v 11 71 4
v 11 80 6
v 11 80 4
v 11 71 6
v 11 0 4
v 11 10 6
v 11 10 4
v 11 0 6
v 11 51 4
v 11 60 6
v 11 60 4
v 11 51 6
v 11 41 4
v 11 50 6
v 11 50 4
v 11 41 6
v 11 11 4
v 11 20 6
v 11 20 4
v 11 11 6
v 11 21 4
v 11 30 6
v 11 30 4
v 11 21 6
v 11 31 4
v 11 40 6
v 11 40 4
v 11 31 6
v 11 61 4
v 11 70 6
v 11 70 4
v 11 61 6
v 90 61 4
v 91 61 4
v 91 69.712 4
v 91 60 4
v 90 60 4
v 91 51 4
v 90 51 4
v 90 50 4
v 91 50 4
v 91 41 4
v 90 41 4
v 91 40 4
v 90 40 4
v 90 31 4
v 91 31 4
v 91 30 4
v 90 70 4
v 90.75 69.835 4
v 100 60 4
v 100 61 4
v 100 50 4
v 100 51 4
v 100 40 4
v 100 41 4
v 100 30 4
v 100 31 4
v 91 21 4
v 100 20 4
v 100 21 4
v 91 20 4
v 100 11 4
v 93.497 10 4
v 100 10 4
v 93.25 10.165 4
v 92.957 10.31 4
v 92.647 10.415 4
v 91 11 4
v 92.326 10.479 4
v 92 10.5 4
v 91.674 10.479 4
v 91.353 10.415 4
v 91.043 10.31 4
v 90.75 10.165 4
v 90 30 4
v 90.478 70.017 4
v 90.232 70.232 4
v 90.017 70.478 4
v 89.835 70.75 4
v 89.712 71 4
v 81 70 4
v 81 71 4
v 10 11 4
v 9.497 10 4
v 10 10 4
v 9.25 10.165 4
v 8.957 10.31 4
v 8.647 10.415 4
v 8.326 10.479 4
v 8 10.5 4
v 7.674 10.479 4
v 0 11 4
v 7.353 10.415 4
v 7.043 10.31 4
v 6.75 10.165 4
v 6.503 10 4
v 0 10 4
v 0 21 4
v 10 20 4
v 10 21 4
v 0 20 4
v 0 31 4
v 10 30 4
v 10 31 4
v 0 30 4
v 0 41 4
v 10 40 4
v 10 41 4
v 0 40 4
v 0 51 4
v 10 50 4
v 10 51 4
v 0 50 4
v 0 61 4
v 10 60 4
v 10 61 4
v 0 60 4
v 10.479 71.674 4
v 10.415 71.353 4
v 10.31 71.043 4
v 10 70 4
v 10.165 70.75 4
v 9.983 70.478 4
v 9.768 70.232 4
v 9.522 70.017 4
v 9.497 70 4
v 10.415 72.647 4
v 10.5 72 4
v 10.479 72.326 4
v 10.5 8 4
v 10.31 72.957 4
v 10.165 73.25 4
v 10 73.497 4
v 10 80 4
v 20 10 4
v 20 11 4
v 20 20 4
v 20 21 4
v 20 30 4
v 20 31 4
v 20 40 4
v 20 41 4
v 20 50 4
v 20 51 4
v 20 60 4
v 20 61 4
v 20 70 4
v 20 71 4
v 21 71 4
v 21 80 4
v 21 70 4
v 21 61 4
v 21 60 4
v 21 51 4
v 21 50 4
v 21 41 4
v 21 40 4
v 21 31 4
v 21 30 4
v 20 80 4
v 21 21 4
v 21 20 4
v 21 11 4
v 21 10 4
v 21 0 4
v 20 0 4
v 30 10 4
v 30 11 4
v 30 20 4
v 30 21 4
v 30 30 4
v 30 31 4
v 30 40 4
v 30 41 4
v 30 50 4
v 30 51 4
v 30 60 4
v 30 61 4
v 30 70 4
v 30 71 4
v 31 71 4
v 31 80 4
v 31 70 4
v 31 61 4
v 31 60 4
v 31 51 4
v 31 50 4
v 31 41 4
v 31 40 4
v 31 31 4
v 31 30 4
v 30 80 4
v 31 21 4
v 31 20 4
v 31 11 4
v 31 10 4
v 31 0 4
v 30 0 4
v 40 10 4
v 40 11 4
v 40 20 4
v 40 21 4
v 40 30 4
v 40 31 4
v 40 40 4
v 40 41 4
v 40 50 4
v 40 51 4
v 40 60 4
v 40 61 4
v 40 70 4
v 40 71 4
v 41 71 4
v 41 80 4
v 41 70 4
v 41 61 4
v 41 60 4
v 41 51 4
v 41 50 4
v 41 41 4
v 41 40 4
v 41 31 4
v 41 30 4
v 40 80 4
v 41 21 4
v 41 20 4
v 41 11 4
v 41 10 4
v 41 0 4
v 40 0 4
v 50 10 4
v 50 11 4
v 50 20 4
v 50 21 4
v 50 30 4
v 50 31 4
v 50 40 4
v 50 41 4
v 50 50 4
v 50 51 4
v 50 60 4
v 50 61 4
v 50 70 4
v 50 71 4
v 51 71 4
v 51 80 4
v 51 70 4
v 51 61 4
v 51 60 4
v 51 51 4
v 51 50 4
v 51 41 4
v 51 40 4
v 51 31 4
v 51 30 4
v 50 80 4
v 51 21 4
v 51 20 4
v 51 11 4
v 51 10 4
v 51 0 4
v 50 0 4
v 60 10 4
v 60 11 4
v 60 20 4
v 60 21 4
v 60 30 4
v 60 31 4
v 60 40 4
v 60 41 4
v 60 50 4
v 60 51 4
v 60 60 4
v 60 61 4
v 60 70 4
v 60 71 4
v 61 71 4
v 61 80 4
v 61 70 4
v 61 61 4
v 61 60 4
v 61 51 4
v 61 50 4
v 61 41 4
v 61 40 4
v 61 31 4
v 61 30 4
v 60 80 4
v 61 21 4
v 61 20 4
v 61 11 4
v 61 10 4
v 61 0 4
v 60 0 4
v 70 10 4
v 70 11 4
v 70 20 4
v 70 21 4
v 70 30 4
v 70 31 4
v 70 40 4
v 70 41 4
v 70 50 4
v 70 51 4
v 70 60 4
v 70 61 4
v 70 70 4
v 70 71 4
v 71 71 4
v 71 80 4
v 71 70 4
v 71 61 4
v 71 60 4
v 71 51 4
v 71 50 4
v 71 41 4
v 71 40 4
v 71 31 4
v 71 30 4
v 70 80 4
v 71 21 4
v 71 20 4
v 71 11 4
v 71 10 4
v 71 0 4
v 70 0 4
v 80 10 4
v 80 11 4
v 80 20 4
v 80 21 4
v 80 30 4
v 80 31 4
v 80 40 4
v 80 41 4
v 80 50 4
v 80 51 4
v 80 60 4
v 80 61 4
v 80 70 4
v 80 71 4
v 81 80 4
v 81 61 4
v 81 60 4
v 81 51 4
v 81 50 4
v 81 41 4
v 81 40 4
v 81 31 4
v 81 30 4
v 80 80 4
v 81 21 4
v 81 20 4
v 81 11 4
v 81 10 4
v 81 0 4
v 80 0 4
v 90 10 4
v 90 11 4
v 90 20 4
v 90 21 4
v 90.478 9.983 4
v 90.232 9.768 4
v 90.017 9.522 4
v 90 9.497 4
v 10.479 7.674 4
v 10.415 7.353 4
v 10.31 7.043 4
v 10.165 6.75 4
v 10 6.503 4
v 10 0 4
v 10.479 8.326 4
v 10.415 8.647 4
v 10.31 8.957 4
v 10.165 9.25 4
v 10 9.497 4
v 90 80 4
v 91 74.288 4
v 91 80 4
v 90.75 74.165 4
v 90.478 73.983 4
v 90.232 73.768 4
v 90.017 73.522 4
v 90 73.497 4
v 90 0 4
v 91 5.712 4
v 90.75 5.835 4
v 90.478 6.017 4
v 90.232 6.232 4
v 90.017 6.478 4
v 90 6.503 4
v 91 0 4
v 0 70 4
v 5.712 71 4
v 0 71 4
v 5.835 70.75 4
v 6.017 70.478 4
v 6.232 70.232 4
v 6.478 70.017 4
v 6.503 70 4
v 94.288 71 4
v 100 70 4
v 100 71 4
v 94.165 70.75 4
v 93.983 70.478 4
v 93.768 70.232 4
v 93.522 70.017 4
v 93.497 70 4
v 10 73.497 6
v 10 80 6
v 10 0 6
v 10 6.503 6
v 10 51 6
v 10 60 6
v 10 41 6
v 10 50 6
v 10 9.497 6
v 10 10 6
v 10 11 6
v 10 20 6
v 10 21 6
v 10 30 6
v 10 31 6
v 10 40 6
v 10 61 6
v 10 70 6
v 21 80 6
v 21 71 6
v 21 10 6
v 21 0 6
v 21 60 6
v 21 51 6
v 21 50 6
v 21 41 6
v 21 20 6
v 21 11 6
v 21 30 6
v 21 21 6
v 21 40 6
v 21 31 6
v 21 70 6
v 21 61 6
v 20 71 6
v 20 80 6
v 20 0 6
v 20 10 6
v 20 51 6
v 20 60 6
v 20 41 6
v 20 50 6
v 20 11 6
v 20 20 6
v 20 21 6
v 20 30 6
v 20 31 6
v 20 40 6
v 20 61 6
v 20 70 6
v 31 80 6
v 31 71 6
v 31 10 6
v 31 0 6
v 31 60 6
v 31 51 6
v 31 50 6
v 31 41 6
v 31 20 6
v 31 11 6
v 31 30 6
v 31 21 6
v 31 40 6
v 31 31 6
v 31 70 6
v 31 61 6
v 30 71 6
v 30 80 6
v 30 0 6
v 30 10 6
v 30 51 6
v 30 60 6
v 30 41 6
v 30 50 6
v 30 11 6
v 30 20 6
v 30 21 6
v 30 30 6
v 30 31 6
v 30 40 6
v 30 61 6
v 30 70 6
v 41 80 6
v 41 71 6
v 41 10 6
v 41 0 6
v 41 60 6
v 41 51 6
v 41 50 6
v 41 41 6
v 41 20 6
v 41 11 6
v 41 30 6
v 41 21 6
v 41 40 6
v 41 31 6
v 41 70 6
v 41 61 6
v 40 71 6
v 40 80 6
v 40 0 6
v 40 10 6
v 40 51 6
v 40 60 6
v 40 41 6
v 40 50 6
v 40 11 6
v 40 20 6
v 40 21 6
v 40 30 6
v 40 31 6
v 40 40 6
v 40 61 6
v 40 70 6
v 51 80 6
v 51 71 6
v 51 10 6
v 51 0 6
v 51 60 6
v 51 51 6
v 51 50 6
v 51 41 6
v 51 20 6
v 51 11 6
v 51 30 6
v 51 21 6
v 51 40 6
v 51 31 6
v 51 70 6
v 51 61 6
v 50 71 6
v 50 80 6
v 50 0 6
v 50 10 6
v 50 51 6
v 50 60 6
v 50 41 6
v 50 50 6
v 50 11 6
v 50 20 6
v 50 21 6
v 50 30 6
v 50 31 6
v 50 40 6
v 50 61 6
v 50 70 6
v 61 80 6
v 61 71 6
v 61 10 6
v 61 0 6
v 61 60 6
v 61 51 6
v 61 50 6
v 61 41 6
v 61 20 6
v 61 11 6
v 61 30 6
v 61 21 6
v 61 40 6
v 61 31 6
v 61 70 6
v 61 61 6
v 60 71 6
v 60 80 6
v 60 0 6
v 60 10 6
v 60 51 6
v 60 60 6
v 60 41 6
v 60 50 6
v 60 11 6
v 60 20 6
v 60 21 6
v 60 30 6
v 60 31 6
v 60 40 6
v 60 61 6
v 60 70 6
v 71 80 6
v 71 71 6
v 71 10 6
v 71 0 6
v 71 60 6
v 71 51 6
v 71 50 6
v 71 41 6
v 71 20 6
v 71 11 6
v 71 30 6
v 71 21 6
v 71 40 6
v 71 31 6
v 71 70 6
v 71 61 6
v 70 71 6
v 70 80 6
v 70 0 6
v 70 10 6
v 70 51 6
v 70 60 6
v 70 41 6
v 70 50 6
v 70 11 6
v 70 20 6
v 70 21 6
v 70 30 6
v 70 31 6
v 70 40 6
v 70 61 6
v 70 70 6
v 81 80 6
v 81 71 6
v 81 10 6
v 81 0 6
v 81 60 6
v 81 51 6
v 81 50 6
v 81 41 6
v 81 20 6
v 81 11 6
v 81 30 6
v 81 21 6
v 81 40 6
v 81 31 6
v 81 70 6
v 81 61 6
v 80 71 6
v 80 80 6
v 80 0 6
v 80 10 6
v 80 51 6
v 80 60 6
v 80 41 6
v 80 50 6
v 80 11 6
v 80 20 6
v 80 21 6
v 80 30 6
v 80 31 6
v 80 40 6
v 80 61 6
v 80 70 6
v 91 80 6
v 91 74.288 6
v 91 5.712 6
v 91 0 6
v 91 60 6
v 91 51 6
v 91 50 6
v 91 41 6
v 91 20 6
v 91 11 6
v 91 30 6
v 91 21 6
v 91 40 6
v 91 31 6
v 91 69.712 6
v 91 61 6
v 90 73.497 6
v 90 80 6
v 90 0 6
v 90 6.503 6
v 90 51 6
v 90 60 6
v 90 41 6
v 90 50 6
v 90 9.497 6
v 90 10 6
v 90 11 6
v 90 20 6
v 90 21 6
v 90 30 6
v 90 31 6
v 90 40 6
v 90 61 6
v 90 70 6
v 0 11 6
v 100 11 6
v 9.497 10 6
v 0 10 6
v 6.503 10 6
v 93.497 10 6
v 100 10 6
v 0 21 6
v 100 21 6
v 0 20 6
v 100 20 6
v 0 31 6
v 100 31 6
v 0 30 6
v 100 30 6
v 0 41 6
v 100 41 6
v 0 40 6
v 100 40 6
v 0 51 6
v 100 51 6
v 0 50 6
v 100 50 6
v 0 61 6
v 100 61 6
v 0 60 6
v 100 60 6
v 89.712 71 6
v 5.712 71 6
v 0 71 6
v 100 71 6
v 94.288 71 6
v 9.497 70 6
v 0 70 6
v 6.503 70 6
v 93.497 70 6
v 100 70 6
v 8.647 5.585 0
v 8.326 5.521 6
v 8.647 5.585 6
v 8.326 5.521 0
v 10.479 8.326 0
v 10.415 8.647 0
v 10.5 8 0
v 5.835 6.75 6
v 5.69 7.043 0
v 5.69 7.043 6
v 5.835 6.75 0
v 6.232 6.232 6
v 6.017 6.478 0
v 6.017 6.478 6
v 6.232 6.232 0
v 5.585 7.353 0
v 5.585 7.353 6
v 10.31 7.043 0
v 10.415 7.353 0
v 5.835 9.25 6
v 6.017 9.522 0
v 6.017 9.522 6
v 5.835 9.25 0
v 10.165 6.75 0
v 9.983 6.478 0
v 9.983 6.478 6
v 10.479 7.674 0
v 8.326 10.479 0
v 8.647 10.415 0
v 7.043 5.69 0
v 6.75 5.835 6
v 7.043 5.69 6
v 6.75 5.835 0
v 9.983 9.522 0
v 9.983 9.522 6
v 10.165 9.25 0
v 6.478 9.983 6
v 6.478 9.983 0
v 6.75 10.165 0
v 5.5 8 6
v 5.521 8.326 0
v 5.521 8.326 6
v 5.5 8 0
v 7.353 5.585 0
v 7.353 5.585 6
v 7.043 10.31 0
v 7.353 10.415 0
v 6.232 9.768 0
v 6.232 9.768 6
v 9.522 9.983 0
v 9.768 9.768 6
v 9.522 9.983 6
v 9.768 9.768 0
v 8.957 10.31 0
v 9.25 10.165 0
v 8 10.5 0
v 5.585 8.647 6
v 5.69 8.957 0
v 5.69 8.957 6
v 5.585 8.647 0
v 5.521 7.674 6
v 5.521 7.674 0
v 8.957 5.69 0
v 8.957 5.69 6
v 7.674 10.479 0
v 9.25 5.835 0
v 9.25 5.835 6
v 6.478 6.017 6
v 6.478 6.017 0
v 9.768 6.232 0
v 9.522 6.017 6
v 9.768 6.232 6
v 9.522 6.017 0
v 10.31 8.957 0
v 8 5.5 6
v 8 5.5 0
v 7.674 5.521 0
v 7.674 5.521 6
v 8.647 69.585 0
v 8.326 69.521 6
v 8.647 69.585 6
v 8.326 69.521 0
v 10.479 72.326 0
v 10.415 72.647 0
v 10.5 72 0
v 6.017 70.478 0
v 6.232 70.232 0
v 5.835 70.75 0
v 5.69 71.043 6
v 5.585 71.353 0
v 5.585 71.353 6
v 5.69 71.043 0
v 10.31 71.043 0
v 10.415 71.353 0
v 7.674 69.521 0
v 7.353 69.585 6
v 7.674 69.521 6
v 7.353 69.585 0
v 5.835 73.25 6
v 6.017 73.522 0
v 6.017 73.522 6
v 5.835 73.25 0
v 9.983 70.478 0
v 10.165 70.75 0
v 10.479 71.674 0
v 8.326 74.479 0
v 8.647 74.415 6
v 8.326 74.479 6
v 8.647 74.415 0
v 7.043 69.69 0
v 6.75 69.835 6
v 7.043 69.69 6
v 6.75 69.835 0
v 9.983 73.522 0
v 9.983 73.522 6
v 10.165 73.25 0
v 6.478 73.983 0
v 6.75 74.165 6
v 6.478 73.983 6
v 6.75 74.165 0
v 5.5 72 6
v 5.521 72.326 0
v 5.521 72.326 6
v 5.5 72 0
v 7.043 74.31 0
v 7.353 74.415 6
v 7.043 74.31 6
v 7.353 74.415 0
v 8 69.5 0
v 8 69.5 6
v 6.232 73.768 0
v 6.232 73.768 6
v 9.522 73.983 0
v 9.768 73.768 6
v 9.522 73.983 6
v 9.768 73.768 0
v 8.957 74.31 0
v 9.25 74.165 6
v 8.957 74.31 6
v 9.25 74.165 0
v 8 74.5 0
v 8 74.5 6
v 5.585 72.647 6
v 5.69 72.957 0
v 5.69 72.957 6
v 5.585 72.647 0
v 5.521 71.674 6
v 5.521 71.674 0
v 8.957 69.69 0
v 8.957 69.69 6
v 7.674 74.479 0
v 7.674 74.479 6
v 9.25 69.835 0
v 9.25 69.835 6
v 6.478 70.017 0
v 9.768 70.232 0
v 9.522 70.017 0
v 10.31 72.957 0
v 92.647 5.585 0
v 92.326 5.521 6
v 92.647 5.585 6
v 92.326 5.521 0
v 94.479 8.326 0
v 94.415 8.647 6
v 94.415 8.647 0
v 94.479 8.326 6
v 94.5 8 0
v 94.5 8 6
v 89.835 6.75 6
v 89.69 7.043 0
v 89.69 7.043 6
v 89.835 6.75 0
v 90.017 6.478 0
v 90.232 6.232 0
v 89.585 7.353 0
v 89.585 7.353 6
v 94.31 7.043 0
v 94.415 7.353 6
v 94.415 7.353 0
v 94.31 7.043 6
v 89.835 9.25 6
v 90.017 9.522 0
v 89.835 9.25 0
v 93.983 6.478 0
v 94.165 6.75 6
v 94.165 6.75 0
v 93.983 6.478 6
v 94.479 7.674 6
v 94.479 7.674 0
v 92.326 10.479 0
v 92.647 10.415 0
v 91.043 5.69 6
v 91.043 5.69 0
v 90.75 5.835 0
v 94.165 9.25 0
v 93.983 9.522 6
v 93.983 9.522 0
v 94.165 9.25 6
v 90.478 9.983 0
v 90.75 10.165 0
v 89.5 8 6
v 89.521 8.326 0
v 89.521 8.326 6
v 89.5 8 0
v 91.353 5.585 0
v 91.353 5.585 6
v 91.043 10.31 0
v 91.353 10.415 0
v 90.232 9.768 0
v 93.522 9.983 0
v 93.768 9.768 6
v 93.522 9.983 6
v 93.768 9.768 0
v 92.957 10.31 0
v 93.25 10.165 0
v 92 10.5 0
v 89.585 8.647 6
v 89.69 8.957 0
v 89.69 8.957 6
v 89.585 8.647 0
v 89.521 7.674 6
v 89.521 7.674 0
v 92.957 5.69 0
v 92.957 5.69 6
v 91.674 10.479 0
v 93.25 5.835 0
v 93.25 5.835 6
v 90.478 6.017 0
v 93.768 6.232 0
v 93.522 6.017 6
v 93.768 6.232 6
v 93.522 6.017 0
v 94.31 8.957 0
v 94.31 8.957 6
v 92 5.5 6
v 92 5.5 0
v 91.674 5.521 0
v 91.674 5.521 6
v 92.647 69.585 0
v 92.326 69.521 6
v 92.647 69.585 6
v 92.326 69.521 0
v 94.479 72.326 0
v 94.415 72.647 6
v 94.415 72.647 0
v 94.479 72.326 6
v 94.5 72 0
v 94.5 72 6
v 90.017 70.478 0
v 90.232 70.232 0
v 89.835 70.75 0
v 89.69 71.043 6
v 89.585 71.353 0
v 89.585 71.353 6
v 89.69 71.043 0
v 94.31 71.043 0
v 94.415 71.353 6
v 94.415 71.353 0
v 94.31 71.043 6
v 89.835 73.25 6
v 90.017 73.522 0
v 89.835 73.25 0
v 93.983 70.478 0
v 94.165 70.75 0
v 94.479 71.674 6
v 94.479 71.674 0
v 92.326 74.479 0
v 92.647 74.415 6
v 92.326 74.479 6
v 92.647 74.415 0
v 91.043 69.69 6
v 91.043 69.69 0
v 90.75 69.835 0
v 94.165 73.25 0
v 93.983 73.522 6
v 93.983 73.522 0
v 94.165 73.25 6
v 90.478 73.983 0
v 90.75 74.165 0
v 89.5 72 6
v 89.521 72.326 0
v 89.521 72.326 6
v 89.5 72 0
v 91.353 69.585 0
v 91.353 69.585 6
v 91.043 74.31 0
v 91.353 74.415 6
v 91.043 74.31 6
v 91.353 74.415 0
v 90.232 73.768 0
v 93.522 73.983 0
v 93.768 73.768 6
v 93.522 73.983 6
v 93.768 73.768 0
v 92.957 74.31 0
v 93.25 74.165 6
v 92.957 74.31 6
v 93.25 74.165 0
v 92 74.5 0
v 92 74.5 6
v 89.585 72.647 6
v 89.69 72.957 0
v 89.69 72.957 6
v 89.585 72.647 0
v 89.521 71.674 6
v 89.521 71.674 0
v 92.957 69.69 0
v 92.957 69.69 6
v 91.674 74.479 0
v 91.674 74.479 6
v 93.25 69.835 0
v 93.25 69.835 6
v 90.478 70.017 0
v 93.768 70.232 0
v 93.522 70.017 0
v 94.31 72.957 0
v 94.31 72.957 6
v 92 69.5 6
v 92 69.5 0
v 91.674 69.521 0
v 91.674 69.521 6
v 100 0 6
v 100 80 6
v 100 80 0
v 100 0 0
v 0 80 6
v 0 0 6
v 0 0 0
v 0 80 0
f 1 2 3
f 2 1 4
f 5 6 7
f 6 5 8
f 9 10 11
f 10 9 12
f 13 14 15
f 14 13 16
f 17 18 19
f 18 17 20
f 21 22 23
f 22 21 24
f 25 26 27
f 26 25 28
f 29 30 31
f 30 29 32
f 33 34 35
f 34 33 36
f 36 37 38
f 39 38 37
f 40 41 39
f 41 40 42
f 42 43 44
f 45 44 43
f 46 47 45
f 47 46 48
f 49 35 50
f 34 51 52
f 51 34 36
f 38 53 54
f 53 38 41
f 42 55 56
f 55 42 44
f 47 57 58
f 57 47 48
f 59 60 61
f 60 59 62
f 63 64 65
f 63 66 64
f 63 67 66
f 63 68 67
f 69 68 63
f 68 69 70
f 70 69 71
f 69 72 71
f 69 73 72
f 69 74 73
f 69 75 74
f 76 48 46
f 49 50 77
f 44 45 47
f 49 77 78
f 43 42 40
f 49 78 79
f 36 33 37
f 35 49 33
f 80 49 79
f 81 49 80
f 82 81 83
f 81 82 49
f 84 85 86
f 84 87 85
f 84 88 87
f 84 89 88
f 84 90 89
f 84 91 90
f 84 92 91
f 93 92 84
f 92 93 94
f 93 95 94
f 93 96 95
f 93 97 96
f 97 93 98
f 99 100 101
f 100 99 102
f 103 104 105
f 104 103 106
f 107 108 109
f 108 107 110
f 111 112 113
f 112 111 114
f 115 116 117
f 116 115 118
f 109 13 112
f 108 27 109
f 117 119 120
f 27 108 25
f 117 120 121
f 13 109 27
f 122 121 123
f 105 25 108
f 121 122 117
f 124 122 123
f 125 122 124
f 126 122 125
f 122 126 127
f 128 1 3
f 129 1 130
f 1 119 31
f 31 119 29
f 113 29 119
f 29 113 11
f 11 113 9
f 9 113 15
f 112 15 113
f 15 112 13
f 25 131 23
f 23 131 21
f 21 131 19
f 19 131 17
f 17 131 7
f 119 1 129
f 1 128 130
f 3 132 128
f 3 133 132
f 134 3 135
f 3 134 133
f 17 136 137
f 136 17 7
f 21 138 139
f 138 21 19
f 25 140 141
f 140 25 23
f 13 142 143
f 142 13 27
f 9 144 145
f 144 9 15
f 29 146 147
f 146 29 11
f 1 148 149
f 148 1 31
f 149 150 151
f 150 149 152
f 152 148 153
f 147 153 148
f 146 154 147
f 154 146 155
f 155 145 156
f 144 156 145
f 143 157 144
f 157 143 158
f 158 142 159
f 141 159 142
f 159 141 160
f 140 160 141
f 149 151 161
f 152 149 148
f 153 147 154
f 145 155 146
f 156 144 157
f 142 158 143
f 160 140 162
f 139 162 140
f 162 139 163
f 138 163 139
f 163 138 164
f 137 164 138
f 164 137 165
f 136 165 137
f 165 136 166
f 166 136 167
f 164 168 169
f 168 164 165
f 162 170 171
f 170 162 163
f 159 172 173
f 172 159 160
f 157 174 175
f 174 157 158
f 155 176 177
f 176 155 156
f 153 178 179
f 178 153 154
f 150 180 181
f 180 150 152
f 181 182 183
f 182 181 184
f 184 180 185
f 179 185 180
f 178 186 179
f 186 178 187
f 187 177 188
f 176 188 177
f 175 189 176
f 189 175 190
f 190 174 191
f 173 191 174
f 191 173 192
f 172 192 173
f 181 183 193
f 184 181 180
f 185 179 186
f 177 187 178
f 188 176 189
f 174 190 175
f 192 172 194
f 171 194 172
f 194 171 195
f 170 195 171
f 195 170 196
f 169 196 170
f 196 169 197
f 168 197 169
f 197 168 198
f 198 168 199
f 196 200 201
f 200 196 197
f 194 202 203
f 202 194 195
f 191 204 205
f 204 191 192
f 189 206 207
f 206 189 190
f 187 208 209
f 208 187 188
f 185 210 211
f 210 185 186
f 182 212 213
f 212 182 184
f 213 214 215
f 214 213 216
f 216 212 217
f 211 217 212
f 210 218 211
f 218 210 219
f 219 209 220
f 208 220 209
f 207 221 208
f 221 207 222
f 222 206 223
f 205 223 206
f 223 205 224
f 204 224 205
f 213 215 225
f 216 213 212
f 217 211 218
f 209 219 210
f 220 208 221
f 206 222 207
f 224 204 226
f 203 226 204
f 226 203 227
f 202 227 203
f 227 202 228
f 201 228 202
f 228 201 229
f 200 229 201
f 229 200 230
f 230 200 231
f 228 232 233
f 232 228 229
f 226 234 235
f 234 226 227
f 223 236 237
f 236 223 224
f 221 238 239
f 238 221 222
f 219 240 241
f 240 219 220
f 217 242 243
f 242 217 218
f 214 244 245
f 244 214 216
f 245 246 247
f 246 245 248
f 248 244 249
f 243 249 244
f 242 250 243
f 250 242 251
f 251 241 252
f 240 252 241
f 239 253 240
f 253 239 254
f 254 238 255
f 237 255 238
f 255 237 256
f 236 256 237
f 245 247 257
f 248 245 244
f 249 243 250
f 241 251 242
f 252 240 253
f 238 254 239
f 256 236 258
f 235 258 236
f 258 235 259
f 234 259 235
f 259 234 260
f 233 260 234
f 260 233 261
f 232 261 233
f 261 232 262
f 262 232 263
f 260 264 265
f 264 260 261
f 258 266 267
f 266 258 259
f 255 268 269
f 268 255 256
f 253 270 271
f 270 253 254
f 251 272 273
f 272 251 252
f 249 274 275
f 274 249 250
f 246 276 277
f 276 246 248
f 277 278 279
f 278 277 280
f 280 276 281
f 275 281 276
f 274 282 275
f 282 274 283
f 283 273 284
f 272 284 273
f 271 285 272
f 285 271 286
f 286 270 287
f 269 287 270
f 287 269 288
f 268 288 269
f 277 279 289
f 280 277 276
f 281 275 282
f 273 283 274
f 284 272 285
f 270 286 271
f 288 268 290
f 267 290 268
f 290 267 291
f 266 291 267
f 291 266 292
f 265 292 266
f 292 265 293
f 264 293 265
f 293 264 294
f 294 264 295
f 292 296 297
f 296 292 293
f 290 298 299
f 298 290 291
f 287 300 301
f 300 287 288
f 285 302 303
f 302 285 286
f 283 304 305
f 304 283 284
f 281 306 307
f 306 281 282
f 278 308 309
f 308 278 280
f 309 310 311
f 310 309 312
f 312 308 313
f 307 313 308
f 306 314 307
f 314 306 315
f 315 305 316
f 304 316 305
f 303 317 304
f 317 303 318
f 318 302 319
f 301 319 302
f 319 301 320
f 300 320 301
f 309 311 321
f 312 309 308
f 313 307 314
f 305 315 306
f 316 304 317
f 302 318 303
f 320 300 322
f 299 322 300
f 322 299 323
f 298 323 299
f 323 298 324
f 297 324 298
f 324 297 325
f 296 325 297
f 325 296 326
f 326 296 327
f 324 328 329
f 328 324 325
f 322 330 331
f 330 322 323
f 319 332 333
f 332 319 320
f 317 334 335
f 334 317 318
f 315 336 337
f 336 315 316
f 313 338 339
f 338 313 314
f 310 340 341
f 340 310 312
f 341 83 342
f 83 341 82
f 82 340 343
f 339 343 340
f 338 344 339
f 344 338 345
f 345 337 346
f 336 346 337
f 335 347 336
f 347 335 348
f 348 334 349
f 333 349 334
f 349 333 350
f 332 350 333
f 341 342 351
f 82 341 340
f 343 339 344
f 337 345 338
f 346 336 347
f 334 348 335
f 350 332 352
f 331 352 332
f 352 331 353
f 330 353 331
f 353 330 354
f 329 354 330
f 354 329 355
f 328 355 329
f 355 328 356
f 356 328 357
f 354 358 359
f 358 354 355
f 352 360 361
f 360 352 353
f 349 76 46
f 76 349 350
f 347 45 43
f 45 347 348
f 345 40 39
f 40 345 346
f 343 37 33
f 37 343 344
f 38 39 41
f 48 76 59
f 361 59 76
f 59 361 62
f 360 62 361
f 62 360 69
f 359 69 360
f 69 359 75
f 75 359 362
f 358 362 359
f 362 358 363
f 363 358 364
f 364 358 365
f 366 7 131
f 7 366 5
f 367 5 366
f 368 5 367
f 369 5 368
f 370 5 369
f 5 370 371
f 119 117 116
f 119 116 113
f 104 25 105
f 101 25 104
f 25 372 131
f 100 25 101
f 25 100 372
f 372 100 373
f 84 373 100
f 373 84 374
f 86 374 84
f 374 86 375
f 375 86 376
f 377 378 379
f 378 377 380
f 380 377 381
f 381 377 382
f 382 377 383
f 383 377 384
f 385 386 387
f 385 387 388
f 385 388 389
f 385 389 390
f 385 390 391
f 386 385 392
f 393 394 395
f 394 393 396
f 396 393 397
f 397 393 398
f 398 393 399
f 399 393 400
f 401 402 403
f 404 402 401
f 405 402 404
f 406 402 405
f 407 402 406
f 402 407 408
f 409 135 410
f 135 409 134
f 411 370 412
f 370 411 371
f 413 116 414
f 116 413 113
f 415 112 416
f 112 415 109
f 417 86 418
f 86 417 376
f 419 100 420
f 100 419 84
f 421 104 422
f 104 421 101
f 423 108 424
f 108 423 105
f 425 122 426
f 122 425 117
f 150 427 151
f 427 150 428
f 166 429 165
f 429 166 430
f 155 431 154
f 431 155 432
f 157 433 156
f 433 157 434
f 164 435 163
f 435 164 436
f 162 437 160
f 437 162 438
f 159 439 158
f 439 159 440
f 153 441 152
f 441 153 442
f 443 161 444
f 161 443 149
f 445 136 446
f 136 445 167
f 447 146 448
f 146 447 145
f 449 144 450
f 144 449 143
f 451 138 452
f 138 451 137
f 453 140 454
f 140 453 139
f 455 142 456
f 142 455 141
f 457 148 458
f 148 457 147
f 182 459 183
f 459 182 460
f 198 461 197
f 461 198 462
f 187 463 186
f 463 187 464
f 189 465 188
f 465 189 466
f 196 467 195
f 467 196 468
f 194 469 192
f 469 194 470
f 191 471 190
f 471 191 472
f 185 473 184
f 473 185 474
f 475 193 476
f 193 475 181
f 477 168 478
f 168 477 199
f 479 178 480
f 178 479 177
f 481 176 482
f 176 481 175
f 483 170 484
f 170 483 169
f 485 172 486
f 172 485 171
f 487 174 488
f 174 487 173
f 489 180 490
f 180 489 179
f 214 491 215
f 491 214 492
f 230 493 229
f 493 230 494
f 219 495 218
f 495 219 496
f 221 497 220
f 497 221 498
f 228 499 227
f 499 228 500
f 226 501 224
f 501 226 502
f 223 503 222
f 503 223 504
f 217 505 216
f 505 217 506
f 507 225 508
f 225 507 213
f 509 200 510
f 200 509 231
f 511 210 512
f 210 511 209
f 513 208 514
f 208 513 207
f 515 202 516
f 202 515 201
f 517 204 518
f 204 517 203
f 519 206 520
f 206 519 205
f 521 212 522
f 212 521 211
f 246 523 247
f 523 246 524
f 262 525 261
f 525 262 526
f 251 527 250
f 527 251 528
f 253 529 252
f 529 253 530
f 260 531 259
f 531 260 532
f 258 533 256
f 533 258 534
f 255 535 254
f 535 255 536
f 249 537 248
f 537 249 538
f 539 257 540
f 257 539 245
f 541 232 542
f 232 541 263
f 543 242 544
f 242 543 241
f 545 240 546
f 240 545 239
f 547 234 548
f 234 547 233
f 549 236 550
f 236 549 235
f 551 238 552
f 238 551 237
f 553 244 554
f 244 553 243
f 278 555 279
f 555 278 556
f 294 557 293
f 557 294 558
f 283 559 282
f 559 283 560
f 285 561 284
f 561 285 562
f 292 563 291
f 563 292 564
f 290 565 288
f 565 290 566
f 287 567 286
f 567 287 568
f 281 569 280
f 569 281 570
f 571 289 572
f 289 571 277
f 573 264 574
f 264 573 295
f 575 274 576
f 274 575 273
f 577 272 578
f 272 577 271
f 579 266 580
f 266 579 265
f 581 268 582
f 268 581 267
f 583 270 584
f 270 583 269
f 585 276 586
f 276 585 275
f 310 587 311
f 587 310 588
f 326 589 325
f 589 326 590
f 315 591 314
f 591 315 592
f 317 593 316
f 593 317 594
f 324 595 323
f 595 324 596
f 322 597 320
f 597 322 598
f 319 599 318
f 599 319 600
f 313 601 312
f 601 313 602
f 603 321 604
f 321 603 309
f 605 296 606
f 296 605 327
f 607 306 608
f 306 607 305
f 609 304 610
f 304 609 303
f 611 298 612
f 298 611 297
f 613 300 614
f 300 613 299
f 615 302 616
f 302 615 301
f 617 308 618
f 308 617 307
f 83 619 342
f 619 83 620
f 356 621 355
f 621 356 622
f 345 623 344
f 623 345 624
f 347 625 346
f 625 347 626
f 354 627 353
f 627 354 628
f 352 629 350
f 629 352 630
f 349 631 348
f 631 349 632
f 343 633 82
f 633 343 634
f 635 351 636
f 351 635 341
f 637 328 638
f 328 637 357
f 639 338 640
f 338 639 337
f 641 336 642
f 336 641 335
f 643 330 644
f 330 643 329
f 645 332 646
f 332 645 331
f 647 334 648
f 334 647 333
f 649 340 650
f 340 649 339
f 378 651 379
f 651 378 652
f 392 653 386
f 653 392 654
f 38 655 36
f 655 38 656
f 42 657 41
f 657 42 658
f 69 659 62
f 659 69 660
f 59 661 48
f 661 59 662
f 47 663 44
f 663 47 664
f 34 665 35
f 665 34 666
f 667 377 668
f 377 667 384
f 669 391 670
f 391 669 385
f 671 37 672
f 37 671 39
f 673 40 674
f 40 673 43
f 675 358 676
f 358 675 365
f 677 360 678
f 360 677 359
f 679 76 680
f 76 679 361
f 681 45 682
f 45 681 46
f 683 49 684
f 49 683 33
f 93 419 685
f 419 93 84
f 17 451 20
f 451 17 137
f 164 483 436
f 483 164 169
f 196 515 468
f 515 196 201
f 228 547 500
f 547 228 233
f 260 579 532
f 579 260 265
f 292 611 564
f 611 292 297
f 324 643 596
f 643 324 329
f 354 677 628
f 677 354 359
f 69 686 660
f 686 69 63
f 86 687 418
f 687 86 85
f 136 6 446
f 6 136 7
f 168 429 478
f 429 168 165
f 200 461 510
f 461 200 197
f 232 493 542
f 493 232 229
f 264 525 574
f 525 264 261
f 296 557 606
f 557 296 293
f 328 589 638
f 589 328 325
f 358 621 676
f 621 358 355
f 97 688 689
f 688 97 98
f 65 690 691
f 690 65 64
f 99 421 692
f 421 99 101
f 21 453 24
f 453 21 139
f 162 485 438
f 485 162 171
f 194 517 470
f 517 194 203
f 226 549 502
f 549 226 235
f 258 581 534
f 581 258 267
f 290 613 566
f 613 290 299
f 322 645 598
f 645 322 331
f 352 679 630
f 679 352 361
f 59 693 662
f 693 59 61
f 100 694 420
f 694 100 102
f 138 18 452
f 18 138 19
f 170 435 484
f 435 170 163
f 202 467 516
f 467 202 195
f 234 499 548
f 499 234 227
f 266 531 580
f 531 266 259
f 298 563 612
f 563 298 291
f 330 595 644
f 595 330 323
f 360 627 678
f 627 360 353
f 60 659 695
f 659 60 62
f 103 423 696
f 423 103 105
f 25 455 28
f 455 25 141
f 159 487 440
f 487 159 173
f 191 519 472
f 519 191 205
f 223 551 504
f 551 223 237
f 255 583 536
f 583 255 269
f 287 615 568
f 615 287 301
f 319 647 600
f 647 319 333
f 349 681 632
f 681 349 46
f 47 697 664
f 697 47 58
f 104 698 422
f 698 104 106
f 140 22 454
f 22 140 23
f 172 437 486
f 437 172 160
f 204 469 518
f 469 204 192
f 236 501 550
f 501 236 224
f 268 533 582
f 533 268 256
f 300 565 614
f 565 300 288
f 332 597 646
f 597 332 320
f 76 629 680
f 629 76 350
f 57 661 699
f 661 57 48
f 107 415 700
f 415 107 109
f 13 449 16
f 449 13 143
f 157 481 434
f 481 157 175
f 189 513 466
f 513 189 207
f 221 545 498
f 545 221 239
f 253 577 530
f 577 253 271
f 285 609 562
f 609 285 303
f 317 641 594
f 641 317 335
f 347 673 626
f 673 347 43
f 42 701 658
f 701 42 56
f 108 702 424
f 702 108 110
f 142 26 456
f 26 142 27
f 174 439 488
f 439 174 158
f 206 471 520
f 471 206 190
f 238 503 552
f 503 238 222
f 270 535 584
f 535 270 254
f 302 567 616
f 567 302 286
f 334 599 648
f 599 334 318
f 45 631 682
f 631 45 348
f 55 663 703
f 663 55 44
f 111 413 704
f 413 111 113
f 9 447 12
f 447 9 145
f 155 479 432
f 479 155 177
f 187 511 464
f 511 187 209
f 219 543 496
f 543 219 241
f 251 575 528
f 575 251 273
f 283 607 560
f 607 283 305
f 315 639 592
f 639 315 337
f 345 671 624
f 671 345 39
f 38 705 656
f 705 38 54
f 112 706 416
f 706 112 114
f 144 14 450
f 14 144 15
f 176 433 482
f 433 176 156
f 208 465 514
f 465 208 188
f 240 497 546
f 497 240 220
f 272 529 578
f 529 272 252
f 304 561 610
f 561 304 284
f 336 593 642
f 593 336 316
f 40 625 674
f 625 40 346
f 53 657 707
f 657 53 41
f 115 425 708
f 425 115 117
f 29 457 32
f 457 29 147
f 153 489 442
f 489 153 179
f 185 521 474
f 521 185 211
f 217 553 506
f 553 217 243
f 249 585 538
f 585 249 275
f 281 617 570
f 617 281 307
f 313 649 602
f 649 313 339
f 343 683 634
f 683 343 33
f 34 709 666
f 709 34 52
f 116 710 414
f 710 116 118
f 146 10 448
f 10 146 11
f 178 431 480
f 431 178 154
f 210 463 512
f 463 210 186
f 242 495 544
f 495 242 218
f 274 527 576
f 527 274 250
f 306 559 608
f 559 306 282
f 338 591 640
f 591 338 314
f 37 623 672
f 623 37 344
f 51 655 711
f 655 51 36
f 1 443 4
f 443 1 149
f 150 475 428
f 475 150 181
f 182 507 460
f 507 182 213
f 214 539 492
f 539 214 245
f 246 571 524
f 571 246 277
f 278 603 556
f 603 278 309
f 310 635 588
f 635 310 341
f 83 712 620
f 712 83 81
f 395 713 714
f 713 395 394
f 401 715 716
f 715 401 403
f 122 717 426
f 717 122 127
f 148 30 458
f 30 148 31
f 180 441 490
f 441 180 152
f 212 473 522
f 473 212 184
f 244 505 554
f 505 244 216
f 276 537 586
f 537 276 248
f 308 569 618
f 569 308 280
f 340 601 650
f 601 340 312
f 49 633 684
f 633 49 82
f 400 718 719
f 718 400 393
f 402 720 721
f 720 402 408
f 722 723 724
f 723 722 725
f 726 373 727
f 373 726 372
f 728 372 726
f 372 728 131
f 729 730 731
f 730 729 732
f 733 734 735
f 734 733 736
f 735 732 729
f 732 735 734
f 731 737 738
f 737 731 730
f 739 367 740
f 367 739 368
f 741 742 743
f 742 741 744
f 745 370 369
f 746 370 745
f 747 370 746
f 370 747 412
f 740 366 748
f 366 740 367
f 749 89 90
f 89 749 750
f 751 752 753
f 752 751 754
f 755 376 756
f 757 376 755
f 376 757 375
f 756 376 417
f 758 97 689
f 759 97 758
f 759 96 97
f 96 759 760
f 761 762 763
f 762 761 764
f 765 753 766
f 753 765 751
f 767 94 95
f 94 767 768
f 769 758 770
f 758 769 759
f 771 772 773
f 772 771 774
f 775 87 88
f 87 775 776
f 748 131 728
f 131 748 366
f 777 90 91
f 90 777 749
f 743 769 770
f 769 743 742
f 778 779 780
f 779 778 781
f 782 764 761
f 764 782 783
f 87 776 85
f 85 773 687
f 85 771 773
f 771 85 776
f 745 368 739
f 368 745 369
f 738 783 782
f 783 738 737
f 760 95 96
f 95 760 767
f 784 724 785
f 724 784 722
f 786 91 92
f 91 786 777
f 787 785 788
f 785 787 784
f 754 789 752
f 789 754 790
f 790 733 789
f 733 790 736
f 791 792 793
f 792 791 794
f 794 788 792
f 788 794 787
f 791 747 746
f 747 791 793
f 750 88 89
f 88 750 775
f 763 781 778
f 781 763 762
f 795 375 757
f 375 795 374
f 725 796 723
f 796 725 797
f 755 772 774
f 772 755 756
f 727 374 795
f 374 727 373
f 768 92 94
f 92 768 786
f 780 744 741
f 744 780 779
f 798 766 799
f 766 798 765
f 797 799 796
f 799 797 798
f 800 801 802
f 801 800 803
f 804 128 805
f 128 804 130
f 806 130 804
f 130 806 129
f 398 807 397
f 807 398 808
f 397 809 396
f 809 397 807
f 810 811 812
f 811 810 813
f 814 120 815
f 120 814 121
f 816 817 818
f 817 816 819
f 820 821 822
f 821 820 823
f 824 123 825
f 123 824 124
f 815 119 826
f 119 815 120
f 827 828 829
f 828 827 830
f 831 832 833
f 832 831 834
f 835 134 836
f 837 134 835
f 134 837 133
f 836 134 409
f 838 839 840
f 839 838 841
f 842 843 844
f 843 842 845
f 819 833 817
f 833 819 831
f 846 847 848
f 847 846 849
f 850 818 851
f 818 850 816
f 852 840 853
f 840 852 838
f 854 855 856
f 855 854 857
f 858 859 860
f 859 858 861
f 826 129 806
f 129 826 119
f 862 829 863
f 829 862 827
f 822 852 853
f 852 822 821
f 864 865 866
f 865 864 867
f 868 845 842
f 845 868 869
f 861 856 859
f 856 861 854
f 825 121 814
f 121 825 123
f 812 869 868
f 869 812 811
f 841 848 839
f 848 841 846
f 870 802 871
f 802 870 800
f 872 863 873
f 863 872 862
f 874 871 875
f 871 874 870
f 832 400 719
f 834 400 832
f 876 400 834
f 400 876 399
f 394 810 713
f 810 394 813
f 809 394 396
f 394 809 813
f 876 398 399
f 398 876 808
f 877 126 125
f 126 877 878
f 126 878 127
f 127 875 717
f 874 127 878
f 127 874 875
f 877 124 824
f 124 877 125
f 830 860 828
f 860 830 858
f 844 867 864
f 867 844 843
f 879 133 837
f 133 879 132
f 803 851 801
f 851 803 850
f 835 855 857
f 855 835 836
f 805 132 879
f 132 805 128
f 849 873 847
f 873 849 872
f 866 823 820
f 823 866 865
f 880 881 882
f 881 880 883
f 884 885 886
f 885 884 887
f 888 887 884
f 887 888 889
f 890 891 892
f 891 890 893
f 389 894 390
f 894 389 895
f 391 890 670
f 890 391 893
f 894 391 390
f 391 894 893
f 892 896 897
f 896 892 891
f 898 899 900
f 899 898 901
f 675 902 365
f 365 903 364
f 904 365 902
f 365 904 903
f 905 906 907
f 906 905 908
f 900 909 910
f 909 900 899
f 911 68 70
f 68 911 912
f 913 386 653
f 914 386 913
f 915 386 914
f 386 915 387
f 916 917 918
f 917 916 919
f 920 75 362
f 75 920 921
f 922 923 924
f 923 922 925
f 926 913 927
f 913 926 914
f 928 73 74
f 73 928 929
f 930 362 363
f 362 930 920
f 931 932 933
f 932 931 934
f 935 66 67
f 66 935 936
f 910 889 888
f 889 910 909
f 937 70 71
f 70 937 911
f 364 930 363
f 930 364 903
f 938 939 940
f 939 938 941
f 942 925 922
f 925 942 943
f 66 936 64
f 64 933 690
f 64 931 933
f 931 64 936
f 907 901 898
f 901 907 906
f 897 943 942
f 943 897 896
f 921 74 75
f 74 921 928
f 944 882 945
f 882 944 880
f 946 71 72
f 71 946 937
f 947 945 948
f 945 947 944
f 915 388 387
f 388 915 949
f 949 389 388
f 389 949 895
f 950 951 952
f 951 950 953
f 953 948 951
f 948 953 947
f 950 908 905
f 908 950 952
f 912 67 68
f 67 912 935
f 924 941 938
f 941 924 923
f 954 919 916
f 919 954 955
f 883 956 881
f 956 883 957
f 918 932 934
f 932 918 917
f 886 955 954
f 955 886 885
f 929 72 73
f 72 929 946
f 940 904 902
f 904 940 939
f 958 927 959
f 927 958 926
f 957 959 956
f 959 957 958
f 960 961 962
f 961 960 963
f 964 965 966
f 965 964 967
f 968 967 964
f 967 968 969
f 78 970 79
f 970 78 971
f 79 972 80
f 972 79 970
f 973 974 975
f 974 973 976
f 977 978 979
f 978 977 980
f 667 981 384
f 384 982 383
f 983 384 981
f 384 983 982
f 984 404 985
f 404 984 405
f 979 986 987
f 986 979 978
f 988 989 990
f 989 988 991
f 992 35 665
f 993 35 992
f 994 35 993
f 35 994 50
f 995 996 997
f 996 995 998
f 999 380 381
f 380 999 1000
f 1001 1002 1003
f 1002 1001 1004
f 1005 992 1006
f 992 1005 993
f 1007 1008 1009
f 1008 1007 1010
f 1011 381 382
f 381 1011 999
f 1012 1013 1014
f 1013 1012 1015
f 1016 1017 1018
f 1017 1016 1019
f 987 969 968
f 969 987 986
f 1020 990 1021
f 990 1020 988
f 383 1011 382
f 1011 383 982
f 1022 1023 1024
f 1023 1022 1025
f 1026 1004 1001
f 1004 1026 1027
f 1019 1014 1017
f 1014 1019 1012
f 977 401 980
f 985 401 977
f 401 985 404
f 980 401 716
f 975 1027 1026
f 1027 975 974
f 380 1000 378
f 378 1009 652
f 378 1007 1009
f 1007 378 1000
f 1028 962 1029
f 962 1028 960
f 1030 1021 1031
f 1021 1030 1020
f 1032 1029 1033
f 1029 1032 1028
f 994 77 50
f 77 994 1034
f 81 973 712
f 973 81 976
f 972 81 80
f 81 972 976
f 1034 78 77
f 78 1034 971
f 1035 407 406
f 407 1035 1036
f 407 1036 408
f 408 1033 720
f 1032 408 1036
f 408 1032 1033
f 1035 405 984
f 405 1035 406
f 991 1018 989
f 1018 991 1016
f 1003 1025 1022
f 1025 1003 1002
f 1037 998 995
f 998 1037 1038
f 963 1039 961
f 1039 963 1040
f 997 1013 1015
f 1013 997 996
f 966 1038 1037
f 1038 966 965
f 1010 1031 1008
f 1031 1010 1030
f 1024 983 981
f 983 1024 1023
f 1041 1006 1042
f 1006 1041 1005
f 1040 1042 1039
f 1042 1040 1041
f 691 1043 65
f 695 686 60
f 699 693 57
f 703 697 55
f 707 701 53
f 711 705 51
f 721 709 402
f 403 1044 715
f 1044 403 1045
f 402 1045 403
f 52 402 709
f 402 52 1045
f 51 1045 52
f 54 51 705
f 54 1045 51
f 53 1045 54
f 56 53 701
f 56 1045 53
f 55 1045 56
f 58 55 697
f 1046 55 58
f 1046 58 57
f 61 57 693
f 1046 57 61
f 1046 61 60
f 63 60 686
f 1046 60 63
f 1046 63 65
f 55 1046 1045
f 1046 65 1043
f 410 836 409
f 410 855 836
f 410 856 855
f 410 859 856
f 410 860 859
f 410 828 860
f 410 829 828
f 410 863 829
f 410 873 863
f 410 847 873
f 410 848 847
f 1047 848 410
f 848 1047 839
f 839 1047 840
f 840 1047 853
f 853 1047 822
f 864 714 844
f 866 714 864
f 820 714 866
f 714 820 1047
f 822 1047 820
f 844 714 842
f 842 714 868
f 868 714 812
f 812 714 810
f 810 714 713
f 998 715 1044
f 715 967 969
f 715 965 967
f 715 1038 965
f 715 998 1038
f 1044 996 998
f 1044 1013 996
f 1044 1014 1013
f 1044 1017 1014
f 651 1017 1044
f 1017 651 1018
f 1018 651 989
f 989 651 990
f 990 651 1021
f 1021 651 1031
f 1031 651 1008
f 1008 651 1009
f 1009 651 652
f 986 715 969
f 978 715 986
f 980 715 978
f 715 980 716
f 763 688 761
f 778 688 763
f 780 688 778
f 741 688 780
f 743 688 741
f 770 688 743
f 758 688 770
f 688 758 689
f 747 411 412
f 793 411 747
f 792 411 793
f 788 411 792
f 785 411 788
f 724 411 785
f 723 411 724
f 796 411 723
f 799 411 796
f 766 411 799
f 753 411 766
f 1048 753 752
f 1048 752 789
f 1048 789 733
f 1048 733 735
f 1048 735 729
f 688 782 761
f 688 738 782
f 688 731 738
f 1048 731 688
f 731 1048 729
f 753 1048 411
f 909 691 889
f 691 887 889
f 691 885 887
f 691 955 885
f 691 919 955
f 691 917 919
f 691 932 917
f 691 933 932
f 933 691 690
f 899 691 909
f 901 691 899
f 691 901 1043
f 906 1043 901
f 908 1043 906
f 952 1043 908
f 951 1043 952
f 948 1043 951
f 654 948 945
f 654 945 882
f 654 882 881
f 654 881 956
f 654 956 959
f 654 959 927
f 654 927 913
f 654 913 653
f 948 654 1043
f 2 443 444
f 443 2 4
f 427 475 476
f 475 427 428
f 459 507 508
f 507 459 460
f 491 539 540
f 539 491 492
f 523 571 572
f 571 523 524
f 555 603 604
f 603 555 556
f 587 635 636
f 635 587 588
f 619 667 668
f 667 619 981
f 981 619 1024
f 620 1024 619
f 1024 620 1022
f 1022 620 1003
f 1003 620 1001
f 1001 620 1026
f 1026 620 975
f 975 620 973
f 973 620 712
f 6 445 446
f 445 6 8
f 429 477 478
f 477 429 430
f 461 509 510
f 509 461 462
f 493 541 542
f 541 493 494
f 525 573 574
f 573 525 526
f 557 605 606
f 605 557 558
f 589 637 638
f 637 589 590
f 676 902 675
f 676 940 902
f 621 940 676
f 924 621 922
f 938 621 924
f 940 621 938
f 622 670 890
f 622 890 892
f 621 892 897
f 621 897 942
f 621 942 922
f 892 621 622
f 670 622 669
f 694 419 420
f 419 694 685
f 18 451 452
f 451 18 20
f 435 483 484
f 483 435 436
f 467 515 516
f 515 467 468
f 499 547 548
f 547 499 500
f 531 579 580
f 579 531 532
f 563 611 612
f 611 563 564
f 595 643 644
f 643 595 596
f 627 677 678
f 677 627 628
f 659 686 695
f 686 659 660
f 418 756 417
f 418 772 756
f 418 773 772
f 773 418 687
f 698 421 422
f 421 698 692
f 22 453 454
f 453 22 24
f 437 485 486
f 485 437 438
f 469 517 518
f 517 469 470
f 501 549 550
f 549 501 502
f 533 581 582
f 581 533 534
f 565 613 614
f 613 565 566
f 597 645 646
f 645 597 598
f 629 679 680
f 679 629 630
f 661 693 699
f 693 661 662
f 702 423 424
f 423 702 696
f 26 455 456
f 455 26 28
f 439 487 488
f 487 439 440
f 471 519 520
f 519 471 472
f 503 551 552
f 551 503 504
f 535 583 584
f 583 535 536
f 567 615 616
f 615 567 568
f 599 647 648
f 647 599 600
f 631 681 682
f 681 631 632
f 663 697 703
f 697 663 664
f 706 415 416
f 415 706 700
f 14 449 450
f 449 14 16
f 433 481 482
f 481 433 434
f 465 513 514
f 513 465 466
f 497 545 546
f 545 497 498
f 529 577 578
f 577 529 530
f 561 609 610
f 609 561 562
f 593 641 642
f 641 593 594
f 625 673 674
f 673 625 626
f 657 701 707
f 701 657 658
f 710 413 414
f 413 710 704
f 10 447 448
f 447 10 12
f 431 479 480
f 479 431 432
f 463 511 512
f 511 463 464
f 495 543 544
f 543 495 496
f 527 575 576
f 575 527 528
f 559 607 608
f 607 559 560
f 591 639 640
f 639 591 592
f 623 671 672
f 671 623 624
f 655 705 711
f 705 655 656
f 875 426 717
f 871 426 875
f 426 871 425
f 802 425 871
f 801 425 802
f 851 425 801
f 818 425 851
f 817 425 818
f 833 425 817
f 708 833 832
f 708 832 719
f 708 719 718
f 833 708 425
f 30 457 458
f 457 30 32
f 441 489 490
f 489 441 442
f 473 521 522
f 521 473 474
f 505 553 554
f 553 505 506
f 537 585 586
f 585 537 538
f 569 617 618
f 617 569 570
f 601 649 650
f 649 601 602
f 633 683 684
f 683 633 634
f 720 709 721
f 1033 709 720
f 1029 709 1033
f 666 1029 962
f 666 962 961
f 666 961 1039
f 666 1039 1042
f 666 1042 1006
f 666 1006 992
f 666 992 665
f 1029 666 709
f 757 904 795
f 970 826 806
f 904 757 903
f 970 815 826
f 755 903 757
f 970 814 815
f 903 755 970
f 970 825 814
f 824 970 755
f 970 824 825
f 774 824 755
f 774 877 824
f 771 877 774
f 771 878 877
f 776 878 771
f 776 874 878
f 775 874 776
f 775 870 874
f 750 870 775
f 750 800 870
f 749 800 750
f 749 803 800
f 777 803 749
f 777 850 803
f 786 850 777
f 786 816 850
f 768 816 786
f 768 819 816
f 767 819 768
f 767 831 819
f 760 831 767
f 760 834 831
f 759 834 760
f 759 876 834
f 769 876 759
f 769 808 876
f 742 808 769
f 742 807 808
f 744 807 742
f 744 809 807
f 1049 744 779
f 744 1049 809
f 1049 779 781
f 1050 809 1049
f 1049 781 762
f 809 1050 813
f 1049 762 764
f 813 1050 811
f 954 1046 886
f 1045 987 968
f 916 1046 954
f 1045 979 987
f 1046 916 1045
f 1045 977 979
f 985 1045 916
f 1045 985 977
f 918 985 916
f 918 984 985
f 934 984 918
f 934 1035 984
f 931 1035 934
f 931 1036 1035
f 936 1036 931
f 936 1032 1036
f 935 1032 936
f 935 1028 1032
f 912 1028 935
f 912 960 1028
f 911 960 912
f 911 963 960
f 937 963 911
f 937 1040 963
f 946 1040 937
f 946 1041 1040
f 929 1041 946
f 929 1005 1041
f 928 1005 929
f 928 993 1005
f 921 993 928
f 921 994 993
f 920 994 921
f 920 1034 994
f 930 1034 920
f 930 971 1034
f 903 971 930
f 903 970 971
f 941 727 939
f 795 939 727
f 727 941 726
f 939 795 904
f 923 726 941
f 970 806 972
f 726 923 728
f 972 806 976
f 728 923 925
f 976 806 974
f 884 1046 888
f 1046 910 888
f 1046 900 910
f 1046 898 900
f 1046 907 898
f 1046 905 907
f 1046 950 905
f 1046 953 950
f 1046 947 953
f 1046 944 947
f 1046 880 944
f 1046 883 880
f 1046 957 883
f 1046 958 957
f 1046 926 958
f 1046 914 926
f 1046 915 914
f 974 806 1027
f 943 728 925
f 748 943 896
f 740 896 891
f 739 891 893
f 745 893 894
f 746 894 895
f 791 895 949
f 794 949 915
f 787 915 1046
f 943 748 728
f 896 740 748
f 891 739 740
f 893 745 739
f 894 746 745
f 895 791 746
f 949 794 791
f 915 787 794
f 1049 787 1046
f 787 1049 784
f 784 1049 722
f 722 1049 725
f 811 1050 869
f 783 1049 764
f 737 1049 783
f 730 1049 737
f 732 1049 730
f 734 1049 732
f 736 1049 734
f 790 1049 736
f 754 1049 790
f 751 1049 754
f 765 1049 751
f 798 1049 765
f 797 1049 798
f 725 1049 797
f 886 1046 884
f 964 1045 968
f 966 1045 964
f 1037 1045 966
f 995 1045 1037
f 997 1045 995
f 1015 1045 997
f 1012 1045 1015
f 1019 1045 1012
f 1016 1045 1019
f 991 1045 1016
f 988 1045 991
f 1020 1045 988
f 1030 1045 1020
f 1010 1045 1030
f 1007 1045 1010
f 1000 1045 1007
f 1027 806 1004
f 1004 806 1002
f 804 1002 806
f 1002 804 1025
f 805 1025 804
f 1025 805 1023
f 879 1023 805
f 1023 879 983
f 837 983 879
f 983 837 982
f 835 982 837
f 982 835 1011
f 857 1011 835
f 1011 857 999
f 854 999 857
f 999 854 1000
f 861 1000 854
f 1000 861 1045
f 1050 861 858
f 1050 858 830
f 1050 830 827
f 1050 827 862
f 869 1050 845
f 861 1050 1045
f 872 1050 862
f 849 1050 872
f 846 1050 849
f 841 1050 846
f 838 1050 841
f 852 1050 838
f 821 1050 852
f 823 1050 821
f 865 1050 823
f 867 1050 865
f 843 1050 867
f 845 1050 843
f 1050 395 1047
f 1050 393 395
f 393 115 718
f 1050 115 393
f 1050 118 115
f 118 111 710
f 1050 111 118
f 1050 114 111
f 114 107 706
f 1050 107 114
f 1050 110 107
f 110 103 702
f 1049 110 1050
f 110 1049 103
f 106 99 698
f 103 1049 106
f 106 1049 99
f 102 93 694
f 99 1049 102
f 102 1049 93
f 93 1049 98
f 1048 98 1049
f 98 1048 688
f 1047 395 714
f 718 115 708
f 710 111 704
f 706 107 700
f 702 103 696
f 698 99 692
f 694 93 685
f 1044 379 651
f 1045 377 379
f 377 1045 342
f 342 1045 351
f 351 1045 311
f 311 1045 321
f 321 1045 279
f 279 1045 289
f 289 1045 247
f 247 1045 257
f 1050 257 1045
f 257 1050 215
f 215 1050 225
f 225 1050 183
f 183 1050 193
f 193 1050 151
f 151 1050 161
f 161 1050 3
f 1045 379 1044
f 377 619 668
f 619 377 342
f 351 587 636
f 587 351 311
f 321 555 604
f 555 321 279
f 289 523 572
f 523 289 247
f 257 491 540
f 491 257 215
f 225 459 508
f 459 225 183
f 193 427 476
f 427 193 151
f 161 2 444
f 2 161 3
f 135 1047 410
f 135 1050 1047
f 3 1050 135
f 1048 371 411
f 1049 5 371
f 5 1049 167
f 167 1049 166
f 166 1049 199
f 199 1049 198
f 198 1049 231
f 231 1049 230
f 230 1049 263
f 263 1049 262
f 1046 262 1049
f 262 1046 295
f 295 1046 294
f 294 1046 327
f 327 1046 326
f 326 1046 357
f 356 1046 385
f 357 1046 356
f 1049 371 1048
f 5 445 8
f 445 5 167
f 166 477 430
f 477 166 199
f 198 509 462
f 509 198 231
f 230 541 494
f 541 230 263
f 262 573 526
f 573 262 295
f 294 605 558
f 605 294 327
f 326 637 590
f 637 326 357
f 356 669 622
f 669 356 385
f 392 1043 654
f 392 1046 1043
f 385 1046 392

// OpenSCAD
$fn=64;
module dicing_jig() {
  difference() {
    cube([100,80,6]);
    for(x=[10:10:90]) translate([x,-1,4]) cube([1,82,3]);
    for(y=[10:10:70]) translate([-1,y,4]) cube([102,1,3]);
    for(x=[8,92]) for(y=[8,72])
      translate([x,y,-1]) cylinder(d=5,h=8,$fn=48);
  }
}
dicing_jig();
